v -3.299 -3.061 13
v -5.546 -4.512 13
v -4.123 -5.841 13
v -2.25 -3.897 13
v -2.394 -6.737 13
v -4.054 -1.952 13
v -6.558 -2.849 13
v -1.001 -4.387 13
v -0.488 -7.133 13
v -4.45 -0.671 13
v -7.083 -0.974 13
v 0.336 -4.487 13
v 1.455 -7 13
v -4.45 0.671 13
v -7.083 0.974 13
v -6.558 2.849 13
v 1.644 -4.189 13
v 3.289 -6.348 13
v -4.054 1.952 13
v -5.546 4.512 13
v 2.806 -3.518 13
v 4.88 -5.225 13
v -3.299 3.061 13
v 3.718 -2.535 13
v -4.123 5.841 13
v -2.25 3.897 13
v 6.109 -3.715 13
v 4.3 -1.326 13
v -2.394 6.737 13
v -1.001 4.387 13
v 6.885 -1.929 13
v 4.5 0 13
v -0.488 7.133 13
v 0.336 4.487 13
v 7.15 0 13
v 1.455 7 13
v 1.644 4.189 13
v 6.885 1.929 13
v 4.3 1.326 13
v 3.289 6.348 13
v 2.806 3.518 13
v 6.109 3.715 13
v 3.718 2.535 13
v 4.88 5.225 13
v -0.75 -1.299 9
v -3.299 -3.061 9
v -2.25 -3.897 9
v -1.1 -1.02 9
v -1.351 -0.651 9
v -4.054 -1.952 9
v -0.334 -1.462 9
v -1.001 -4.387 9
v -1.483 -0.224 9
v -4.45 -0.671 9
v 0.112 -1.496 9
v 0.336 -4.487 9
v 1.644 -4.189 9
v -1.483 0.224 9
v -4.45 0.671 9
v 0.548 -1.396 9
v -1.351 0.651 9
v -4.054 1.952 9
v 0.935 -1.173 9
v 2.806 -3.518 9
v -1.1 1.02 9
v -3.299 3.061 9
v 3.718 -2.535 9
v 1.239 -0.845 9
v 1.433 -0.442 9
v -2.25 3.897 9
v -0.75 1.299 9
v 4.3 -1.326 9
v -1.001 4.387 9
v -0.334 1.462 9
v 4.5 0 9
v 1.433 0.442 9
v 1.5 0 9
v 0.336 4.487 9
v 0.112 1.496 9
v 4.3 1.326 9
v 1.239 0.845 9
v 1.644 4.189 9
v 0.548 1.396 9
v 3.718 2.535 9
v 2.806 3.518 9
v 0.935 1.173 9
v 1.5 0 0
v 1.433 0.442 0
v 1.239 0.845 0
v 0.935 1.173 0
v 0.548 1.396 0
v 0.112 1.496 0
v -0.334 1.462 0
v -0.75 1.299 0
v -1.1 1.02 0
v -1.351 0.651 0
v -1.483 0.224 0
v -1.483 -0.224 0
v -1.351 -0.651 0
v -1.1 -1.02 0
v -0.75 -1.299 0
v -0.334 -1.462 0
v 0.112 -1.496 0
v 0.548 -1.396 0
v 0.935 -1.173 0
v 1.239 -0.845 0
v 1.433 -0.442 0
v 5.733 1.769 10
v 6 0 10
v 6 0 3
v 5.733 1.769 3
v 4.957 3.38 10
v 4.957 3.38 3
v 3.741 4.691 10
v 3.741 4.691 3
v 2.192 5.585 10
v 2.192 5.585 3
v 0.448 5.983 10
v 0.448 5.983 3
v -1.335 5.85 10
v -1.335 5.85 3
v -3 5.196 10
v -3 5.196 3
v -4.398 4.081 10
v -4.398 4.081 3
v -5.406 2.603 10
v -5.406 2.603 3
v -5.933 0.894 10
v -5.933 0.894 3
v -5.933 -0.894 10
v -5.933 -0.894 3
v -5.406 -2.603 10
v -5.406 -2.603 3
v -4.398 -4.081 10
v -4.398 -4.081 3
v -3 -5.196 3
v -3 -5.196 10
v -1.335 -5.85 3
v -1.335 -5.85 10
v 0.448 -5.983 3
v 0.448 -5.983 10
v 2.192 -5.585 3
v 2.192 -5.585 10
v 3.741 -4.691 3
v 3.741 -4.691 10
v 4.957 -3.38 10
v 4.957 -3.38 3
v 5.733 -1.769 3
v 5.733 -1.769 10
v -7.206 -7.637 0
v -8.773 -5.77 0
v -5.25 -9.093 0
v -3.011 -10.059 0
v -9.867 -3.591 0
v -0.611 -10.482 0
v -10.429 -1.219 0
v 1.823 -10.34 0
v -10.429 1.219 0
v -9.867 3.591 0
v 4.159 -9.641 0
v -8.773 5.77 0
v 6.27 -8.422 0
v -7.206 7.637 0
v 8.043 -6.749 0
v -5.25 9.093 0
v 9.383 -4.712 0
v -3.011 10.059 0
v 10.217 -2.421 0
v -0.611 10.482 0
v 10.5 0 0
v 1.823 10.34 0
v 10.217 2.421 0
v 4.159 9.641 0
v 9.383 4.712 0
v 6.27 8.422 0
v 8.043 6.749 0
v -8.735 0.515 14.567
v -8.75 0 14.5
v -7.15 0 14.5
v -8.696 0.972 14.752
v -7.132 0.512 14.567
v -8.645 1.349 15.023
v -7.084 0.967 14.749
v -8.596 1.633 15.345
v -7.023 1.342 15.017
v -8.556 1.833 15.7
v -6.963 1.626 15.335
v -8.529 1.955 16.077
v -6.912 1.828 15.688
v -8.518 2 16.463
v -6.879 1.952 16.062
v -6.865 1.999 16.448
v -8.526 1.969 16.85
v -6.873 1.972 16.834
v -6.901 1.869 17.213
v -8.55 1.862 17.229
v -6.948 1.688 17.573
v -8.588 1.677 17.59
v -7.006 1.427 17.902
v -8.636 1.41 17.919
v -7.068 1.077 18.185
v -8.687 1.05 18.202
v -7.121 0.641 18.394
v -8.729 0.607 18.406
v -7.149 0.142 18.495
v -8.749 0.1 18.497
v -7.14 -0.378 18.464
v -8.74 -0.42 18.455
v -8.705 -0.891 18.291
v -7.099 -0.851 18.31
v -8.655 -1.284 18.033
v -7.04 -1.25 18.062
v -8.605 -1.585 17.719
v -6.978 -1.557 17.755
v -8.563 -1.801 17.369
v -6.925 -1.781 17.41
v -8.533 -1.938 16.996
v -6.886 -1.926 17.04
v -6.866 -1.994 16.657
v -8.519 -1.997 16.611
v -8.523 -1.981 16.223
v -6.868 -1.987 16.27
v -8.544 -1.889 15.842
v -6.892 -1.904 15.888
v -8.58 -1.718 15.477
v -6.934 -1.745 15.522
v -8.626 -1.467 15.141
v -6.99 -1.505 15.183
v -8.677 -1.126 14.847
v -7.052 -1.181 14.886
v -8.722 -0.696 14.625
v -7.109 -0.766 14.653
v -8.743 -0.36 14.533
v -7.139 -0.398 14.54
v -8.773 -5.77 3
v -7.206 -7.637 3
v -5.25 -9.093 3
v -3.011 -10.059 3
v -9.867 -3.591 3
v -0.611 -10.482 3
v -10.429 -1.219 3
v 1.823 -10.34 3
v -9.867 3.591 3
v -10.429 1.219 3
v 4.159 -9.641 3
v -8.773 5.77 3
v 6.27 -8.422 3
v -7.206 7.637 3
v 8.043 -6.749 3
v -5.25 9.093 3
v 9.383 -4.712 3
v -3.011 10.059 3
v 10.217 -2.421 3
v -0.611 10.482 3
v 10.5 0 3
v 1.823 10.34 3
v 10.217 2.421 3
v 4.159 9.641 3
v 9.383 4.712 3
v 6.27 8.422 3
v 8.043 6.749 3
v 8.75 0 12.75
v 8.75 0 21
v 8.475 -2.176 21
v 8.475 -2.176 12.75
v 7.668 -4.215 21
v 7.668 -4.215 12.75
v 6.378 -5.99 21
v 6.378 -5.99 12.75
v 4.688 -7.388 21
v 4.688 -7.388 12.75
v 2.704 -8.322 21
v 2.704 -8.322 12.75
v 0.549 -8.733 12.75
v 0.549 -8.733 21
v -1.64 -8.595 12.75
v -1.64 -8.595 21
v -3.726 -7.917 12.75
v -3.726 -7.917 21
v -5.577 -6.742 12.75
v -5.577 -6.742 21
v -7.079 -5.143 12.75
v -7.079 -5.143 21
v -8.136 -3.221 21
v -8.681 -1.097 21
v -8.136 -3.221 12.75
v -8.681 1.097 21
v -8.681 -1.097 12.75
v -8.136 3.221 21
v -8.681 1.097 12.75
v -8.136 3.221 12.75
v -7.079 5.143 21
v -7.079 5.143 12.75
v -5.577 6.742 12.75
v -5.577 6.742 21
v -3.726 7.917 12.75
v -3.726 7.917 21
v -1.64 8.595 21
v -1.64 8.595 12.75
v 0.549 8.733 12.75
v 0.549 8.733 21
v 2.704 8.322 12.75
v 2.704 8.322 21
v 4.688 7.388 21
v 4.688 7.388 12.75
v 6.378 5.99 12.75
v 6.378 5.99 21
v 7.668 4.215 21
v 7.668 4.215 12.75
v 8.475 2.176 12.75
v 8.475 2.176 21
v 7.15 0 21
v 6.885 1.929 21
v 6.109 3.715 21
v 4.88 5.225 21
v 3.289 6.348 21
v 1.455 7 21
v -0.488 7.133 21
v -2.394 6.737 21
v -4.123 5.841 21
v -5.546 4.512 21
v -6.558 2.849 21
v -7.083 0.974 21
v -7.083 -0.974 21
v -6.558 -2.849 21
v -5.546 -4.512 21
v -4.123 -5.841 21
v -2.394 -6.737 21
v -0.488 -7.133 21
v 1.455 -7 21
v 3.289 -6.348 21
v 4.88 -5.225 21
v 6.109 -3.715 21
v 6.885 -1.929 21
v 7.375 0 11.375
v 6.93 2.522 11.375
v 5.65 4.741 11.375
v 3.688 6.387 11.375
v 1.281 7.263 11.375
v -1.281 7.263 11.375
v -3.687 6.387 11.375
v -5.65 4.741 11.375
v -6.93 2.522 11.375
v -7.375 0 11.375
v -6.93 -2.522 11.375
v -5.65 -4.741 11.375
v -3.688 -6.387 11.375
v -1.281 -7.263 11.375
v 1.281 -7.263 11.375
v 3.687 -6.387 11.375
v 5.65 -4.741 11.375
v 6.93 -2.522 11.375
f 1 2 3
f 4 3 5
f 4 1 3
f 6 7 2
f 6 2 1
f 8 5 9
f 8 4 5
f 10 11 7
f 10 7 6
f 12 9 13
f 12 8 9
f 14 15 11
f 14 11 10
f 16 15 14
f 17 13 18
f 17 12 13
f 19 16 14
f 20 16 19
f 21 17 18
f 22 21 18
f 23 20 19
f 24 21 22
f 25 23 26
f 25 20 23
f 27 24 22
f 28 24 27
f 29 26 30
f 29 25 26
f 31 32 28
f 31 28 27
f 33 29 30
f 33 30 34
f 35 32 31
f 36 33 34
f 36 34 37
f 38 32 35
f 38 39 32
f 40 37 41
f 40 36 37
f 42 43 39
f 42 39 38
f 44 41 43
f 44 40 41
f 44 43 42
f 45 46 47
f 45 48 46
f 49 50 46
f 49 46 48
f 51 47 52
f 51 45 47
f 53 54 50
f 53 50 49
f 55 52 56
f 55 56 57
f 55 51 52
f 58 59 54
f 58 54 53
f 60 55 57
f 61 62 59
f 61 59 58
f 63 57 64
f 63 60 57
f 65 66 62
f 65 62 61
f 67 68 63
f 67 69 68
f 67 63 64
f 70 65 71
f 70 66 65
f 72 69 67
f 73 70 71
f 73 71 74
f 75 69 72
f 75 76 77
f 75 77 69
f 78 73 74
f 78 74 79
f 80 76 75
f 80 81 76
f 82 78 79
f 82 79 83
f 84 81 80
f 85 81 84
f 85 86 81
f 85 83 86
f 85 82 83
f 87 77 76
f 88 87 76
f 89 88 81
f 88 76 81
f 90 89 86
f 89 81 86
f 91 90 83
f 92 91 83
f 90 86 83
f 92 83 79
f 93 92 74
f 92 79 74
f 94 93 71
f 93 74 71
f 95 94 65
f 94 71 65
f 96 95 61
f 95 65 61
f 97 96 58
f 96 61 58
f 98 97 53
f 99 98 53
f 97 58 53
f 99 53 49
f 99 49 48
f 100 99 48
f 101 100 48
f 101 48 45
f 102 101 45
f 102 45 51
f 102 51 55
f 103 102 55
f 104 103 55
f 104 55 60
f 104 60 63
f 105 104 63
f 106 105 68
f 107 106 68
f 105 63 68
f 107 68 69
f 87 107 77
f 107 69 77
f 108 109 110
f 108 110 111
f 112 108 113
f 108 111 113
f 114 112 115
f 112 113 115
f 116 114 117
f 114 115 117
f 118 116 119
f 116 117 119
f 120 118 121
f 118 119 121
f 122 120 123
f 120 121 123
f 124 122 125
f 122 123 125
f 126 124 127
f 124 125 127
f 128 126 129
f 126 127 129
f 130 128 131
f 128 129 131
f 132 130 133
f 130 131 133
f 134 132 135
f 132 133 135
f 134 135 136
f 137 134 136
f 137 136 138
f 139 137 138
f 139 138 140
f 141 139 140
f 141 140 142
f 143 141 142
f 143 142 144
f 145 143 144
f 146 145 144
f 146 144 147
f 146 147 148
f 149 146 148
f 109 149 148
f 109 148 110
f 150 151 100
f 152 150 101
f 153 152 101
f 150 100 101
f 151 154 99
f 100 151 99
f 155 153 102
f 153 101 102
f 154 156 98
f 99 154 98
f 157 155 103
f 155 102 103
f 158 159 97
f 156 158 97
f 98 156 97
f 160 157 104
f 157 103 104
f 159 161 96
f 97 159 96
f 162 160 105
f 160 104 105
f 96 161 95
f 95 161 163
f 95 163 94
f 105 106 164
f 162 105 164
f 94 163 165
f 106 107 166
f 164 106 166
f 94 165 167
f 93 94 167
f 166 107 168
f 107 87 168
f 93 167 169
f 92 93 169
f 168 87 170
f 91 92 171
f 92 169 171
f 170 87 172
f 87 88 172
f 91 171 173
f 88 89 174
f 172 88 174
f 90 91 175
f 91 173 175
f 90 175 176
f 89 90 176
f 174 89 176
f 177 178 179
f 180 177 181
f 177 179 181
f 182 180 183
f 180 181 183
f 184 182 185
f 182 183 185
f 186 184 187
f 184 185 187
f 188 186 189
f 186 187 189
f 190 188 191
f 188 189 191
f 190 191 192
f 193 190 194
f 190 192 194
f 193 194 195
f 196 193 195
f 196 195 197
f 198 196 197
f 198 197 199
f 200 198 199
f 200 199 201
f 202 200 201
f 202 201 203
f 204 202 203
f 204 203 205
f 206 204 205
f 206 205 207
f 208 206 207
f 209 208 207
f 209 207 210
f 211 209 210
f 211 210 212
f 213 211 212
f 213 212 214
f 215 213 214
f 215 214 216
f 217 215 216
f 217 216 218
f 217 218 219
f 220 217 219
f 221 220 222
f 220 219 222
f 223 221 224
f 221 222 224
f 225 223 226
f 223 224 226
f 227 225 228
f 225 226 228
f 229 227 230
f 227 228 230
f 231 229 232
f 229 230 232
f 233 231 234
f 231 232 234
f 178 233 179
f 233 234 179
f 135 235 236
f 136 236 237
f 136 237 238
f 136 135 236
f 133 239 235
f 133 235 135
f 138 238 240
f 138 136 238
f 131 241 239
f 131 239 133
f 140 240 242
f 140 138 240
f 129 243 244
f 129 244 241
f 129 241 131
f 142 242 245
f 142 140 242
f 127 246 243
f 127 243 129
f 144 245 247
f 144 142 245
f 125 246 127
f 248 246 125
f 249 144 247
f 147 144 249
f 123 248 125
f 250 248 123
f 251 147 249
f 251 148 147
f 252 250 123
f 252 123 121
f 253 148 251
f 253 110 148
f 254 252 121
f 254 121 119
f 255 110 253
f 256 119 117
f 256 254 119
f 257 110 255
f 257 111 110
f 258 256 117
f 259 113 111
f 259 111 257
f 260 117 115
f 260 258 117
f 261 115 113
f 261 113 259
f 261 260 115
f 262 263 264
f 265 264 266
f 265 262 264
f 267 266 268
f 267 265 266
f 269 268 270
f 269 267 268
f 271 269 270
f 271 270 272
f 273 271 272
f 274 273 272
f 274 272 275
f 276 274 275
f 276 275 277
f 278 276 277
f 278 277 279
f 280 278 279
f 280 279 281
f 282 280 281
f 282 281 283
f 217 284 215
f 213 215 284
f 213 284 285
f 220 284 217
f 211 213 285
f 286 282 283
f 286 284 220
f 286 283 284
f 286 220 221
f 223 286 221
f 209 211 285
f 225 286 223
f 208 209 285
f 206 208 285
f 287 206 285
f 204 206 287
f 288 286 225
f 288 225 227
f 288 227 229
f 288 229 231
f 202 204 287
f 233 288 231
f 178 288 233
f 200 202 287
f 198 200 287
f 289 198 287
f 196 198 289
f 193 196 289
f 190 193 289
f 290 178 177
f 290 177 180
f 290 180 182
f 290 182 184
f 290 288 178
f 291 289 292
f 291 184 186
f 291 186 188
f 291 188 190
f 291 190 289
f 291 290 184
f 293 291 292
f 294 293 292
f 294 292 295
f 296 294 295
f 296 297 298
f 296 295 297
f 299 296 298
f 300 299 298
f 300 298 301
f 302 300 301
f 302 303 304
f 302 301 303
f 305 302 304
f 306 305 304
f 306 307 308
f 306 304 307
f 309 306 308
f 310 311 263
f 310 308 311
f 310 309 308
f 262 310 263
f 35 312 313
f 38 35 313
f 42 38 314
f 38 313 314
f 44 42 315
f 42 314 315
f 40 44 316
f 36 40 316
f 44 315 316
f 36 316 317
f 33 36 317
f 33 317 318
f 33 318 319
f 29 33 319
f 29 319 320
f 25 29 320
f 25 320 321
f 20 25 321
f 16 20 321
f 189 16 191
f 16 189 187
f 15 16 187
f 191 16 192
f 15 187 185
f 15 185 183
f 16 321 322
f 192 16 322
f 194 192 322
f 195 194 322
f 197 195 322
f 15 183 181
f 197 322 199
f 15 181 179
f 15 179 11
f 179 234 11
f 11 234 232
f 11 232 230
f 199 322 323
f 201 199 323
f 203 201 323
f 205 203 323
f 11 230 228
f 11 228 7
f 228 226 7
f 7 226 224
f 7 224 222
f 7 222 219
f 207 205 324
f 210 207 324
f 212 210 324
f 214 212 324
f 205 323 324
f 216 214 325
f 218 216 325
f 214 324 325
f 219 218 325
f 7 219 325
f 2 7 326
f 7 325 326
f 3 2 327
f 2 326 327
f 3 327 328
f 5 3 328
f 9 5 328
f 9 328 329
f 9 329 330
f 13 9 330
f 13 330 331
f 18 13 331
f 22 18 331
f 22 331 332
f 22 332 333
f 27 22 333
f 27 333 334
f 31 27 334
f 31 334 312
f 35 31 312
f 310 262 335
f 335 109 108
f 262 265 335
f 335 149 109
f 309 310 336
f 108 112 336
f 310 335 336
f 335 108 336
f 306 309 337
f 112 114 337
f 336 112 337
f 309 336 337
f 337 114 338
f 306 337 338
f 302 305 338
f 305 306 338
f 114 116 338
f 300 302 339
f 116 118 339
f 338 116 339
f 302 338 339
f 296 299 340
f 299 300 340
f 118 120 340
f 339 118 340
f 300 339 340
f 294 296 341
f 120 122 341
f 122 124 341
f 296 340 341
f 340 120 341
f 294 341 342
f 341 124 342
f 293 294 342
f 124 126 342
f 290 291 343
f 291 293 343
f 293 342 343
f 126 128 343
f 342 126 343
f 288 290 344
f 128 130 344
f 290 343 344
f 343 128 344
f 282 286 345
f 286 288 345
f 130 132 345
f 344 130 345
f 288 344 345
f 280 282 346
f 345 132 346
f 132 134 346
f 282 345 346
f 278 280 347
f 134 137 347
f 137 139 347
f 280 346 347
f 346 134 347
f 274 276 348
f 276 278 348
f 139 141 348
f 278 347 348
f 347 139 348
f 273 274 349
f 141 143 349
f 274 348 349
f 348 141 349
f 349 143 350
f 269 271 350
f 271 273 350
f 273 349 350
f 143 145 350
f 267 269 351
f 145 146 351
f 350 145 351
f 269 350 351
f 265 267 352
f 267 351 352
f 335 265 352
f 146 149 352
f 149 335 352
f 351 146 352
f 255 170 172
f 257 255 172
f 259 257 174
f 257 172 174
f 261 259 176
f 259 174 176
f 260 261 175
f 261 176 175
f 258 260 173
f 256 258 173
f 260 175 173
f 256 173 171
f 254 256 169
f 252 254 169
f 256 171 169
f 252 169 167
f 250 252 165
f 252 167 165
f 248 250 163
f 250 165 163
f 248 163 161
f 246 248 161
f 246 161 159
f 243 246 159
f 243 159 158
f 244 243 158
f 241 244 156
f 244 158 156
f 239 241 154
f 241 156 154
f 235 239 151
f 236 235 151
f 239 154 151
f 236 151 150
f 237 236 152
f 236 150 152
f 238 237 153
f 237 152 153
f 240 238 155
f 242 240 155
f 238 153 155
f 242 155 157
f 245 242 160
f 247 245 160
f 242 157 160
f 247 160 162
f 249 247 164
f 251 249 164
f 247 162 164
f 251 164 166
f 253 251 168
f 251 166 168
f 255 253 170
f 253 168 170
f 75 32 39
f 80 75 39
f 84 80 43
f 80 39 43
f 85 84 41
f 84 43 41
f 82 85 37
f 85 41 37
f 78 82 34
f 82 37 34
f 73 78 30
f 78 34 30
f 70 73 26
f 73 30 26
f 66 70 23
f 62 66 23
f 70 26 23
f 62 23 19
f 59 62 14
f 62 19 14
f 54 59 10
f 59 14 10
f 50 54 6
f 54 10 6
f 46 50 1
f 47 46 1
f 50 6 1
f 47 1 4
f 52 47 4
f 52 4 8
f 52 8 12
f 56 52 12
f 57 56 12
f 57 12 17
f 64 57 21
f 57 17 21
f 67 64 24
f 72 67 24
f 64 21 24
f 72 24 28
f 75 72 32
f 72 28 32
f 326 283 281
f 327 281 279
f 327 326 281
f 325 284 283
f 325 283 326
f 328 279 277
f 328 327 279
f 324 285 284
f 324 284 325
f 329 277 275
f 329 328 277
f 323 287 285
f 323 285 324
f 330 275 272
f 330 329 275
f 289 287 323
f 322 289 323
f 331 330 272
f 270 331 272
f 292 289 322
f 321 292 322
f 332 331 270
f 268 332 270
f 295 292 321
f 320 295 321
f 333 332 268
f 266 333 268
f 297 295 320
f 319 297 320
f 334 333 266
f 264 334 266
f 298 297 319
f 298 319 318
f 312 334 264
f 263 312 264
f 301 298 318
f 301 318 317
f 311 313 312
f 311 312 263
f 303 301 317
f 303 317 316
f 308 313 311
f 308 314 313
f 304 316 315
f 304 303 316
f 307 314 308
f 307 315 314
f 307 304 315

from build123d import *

# Parameters (mm, degrees)
SKETCH1_R               = 10.5
BOSS_EXTRUDE2_DEPTH     = 3
SKETCH2_R               = 6
BOSS_EXTRUDE3_DEPTH     = 10
SKETCH3_R               = 4.5
CUT_EXTRUDE1_DEPTH      = 4
SKETCH4_R               = 8.75
BOSS_EXTRUDE4_DEPTH     = 8
CHAMFER1_SIZE           = 3
SKETCH5_R               = 7.15
CUT_EXTRUDE3_DEPTH      = 8
SKETCH6_R               = 1.5
CUT_EXTRUDE4_DEPTH      = 9
CUT_EXTRUDE5_REACH      = 27.72
CUT_EXTRUDE5_END_RADIUS = 8.75
SKETCH7_R               = 2


with BuildPart() as part:
    # Sketch1 → Boss-Extrude2 (new body)
    with BuildSketch(Plane.XY):
        Circle(SKETCH1_R)
    extrude(amount=BOSS_EXTRUDE2_DEPTH)

    # Sketch2 → Boss-Extrude3 (add)
    with BuildSketch(Plane.XY.offset(3)):
        Circle(SKETCH2_R)
    extrude(amount=BOSS_EXTRUDE3_DEPTH)

    # Sketch3 → Cut-Extrude1 (cut)
    with BuildSketch(Plane.XY.offset(13)):
        Circle(SKETCH3_R)
    extrude(amount=-CUT_EXTRUDE1_DEPTH, mode=Mode.SUBTRACT)

    # Sketch4 → Boss-Extrude4 (add)
    with BuildSketch(Plane.XY.offset(13)):
        Circle(SKETCH4_R)
    extrude(amount=BOSS_EXTRUDE4_DEPTH)

    # Chamfer1
    # the kernel refuses this chamfer: 3 mm, written as the material it adds along each edge
    with BuildSketch(Plane(origin=(0, 0, 13), x_dir=(1, 0, 0), z_dir=(0, -1, 0))) as chamfer1_piece_1_section:
        Polygon((6 + CHAMFER1_SIZE, 0), (6, -CHAMFER1_SIZE), (6, 0), align=None)
    chamfer1_piece_1 = revolve(axis=Axis((0, 0, 13), (0, 0, 1)), mode=Mode.PRIVATE)
    chamfer1_piece_1 = chamfer1_piece_1 & Plane(origin=(0, 0, 11.374833607), x_dir=(1, 0, 0), z_dir=(0, 0, -1)) * Cylinder(8.75, 36, mode=Mode.PRIVATE)
    add(chamfer1_piece_1)

    # Sketch5 → Cut-Extrude3 (cut)
    with BuildSketch(Plane.XY.offset(21)):
        Circle(SKETCH5_R)
    extrude(amount=-CUT_EXTRUDE3_DEPTH, mode=Mode.SUBTRACT)

    # Sketch6 → Cut-Extrude4 (cut)
    with BuildSketch(Plane.XY.offset(9)):
        Circle(SKETCH6_R)
    extrude(amount=-CUT_EXTRUDE4_DEPTH, mode=Mode.SUBTRACT)

    # Cut-Extrude5: up to this cylinder (the profile starts inside it)
    cut_extrude5_end = Plane(origin=(0, 0, 16.5), z_dir=(0, 0, -1)) * Cylinder(CUT_EXTRUDE5_END_RADIUS, 73.94, mode=Mode.PRIVATE)
    # Sketch7 → Cut-Extrude5 (cut, up to the surface)
    with BuildSketch(Plane(origin=(0, 0, 0), x_dir=(0, 0, -1), z_dir=(1, 0, 0)), mode=Mode.PRIVATE) as cut_extrude5_sk1:
        with Locations((-16.5, 0)):
            Circle(SKETCH7_R)
    cut_extrude5_tool1 = extrude(cut_extrude5_sk1.sketch, amount=-CUT_EXTRUDE5_REACH, mode=Mode.PRIVATE) & cut_extrude5_end
    add(cut_extrude5_tool1.solids().sort_by_distance((0, 0, 16.5))[0], mode=Mode.SUBTRACT)


solid = part.part
